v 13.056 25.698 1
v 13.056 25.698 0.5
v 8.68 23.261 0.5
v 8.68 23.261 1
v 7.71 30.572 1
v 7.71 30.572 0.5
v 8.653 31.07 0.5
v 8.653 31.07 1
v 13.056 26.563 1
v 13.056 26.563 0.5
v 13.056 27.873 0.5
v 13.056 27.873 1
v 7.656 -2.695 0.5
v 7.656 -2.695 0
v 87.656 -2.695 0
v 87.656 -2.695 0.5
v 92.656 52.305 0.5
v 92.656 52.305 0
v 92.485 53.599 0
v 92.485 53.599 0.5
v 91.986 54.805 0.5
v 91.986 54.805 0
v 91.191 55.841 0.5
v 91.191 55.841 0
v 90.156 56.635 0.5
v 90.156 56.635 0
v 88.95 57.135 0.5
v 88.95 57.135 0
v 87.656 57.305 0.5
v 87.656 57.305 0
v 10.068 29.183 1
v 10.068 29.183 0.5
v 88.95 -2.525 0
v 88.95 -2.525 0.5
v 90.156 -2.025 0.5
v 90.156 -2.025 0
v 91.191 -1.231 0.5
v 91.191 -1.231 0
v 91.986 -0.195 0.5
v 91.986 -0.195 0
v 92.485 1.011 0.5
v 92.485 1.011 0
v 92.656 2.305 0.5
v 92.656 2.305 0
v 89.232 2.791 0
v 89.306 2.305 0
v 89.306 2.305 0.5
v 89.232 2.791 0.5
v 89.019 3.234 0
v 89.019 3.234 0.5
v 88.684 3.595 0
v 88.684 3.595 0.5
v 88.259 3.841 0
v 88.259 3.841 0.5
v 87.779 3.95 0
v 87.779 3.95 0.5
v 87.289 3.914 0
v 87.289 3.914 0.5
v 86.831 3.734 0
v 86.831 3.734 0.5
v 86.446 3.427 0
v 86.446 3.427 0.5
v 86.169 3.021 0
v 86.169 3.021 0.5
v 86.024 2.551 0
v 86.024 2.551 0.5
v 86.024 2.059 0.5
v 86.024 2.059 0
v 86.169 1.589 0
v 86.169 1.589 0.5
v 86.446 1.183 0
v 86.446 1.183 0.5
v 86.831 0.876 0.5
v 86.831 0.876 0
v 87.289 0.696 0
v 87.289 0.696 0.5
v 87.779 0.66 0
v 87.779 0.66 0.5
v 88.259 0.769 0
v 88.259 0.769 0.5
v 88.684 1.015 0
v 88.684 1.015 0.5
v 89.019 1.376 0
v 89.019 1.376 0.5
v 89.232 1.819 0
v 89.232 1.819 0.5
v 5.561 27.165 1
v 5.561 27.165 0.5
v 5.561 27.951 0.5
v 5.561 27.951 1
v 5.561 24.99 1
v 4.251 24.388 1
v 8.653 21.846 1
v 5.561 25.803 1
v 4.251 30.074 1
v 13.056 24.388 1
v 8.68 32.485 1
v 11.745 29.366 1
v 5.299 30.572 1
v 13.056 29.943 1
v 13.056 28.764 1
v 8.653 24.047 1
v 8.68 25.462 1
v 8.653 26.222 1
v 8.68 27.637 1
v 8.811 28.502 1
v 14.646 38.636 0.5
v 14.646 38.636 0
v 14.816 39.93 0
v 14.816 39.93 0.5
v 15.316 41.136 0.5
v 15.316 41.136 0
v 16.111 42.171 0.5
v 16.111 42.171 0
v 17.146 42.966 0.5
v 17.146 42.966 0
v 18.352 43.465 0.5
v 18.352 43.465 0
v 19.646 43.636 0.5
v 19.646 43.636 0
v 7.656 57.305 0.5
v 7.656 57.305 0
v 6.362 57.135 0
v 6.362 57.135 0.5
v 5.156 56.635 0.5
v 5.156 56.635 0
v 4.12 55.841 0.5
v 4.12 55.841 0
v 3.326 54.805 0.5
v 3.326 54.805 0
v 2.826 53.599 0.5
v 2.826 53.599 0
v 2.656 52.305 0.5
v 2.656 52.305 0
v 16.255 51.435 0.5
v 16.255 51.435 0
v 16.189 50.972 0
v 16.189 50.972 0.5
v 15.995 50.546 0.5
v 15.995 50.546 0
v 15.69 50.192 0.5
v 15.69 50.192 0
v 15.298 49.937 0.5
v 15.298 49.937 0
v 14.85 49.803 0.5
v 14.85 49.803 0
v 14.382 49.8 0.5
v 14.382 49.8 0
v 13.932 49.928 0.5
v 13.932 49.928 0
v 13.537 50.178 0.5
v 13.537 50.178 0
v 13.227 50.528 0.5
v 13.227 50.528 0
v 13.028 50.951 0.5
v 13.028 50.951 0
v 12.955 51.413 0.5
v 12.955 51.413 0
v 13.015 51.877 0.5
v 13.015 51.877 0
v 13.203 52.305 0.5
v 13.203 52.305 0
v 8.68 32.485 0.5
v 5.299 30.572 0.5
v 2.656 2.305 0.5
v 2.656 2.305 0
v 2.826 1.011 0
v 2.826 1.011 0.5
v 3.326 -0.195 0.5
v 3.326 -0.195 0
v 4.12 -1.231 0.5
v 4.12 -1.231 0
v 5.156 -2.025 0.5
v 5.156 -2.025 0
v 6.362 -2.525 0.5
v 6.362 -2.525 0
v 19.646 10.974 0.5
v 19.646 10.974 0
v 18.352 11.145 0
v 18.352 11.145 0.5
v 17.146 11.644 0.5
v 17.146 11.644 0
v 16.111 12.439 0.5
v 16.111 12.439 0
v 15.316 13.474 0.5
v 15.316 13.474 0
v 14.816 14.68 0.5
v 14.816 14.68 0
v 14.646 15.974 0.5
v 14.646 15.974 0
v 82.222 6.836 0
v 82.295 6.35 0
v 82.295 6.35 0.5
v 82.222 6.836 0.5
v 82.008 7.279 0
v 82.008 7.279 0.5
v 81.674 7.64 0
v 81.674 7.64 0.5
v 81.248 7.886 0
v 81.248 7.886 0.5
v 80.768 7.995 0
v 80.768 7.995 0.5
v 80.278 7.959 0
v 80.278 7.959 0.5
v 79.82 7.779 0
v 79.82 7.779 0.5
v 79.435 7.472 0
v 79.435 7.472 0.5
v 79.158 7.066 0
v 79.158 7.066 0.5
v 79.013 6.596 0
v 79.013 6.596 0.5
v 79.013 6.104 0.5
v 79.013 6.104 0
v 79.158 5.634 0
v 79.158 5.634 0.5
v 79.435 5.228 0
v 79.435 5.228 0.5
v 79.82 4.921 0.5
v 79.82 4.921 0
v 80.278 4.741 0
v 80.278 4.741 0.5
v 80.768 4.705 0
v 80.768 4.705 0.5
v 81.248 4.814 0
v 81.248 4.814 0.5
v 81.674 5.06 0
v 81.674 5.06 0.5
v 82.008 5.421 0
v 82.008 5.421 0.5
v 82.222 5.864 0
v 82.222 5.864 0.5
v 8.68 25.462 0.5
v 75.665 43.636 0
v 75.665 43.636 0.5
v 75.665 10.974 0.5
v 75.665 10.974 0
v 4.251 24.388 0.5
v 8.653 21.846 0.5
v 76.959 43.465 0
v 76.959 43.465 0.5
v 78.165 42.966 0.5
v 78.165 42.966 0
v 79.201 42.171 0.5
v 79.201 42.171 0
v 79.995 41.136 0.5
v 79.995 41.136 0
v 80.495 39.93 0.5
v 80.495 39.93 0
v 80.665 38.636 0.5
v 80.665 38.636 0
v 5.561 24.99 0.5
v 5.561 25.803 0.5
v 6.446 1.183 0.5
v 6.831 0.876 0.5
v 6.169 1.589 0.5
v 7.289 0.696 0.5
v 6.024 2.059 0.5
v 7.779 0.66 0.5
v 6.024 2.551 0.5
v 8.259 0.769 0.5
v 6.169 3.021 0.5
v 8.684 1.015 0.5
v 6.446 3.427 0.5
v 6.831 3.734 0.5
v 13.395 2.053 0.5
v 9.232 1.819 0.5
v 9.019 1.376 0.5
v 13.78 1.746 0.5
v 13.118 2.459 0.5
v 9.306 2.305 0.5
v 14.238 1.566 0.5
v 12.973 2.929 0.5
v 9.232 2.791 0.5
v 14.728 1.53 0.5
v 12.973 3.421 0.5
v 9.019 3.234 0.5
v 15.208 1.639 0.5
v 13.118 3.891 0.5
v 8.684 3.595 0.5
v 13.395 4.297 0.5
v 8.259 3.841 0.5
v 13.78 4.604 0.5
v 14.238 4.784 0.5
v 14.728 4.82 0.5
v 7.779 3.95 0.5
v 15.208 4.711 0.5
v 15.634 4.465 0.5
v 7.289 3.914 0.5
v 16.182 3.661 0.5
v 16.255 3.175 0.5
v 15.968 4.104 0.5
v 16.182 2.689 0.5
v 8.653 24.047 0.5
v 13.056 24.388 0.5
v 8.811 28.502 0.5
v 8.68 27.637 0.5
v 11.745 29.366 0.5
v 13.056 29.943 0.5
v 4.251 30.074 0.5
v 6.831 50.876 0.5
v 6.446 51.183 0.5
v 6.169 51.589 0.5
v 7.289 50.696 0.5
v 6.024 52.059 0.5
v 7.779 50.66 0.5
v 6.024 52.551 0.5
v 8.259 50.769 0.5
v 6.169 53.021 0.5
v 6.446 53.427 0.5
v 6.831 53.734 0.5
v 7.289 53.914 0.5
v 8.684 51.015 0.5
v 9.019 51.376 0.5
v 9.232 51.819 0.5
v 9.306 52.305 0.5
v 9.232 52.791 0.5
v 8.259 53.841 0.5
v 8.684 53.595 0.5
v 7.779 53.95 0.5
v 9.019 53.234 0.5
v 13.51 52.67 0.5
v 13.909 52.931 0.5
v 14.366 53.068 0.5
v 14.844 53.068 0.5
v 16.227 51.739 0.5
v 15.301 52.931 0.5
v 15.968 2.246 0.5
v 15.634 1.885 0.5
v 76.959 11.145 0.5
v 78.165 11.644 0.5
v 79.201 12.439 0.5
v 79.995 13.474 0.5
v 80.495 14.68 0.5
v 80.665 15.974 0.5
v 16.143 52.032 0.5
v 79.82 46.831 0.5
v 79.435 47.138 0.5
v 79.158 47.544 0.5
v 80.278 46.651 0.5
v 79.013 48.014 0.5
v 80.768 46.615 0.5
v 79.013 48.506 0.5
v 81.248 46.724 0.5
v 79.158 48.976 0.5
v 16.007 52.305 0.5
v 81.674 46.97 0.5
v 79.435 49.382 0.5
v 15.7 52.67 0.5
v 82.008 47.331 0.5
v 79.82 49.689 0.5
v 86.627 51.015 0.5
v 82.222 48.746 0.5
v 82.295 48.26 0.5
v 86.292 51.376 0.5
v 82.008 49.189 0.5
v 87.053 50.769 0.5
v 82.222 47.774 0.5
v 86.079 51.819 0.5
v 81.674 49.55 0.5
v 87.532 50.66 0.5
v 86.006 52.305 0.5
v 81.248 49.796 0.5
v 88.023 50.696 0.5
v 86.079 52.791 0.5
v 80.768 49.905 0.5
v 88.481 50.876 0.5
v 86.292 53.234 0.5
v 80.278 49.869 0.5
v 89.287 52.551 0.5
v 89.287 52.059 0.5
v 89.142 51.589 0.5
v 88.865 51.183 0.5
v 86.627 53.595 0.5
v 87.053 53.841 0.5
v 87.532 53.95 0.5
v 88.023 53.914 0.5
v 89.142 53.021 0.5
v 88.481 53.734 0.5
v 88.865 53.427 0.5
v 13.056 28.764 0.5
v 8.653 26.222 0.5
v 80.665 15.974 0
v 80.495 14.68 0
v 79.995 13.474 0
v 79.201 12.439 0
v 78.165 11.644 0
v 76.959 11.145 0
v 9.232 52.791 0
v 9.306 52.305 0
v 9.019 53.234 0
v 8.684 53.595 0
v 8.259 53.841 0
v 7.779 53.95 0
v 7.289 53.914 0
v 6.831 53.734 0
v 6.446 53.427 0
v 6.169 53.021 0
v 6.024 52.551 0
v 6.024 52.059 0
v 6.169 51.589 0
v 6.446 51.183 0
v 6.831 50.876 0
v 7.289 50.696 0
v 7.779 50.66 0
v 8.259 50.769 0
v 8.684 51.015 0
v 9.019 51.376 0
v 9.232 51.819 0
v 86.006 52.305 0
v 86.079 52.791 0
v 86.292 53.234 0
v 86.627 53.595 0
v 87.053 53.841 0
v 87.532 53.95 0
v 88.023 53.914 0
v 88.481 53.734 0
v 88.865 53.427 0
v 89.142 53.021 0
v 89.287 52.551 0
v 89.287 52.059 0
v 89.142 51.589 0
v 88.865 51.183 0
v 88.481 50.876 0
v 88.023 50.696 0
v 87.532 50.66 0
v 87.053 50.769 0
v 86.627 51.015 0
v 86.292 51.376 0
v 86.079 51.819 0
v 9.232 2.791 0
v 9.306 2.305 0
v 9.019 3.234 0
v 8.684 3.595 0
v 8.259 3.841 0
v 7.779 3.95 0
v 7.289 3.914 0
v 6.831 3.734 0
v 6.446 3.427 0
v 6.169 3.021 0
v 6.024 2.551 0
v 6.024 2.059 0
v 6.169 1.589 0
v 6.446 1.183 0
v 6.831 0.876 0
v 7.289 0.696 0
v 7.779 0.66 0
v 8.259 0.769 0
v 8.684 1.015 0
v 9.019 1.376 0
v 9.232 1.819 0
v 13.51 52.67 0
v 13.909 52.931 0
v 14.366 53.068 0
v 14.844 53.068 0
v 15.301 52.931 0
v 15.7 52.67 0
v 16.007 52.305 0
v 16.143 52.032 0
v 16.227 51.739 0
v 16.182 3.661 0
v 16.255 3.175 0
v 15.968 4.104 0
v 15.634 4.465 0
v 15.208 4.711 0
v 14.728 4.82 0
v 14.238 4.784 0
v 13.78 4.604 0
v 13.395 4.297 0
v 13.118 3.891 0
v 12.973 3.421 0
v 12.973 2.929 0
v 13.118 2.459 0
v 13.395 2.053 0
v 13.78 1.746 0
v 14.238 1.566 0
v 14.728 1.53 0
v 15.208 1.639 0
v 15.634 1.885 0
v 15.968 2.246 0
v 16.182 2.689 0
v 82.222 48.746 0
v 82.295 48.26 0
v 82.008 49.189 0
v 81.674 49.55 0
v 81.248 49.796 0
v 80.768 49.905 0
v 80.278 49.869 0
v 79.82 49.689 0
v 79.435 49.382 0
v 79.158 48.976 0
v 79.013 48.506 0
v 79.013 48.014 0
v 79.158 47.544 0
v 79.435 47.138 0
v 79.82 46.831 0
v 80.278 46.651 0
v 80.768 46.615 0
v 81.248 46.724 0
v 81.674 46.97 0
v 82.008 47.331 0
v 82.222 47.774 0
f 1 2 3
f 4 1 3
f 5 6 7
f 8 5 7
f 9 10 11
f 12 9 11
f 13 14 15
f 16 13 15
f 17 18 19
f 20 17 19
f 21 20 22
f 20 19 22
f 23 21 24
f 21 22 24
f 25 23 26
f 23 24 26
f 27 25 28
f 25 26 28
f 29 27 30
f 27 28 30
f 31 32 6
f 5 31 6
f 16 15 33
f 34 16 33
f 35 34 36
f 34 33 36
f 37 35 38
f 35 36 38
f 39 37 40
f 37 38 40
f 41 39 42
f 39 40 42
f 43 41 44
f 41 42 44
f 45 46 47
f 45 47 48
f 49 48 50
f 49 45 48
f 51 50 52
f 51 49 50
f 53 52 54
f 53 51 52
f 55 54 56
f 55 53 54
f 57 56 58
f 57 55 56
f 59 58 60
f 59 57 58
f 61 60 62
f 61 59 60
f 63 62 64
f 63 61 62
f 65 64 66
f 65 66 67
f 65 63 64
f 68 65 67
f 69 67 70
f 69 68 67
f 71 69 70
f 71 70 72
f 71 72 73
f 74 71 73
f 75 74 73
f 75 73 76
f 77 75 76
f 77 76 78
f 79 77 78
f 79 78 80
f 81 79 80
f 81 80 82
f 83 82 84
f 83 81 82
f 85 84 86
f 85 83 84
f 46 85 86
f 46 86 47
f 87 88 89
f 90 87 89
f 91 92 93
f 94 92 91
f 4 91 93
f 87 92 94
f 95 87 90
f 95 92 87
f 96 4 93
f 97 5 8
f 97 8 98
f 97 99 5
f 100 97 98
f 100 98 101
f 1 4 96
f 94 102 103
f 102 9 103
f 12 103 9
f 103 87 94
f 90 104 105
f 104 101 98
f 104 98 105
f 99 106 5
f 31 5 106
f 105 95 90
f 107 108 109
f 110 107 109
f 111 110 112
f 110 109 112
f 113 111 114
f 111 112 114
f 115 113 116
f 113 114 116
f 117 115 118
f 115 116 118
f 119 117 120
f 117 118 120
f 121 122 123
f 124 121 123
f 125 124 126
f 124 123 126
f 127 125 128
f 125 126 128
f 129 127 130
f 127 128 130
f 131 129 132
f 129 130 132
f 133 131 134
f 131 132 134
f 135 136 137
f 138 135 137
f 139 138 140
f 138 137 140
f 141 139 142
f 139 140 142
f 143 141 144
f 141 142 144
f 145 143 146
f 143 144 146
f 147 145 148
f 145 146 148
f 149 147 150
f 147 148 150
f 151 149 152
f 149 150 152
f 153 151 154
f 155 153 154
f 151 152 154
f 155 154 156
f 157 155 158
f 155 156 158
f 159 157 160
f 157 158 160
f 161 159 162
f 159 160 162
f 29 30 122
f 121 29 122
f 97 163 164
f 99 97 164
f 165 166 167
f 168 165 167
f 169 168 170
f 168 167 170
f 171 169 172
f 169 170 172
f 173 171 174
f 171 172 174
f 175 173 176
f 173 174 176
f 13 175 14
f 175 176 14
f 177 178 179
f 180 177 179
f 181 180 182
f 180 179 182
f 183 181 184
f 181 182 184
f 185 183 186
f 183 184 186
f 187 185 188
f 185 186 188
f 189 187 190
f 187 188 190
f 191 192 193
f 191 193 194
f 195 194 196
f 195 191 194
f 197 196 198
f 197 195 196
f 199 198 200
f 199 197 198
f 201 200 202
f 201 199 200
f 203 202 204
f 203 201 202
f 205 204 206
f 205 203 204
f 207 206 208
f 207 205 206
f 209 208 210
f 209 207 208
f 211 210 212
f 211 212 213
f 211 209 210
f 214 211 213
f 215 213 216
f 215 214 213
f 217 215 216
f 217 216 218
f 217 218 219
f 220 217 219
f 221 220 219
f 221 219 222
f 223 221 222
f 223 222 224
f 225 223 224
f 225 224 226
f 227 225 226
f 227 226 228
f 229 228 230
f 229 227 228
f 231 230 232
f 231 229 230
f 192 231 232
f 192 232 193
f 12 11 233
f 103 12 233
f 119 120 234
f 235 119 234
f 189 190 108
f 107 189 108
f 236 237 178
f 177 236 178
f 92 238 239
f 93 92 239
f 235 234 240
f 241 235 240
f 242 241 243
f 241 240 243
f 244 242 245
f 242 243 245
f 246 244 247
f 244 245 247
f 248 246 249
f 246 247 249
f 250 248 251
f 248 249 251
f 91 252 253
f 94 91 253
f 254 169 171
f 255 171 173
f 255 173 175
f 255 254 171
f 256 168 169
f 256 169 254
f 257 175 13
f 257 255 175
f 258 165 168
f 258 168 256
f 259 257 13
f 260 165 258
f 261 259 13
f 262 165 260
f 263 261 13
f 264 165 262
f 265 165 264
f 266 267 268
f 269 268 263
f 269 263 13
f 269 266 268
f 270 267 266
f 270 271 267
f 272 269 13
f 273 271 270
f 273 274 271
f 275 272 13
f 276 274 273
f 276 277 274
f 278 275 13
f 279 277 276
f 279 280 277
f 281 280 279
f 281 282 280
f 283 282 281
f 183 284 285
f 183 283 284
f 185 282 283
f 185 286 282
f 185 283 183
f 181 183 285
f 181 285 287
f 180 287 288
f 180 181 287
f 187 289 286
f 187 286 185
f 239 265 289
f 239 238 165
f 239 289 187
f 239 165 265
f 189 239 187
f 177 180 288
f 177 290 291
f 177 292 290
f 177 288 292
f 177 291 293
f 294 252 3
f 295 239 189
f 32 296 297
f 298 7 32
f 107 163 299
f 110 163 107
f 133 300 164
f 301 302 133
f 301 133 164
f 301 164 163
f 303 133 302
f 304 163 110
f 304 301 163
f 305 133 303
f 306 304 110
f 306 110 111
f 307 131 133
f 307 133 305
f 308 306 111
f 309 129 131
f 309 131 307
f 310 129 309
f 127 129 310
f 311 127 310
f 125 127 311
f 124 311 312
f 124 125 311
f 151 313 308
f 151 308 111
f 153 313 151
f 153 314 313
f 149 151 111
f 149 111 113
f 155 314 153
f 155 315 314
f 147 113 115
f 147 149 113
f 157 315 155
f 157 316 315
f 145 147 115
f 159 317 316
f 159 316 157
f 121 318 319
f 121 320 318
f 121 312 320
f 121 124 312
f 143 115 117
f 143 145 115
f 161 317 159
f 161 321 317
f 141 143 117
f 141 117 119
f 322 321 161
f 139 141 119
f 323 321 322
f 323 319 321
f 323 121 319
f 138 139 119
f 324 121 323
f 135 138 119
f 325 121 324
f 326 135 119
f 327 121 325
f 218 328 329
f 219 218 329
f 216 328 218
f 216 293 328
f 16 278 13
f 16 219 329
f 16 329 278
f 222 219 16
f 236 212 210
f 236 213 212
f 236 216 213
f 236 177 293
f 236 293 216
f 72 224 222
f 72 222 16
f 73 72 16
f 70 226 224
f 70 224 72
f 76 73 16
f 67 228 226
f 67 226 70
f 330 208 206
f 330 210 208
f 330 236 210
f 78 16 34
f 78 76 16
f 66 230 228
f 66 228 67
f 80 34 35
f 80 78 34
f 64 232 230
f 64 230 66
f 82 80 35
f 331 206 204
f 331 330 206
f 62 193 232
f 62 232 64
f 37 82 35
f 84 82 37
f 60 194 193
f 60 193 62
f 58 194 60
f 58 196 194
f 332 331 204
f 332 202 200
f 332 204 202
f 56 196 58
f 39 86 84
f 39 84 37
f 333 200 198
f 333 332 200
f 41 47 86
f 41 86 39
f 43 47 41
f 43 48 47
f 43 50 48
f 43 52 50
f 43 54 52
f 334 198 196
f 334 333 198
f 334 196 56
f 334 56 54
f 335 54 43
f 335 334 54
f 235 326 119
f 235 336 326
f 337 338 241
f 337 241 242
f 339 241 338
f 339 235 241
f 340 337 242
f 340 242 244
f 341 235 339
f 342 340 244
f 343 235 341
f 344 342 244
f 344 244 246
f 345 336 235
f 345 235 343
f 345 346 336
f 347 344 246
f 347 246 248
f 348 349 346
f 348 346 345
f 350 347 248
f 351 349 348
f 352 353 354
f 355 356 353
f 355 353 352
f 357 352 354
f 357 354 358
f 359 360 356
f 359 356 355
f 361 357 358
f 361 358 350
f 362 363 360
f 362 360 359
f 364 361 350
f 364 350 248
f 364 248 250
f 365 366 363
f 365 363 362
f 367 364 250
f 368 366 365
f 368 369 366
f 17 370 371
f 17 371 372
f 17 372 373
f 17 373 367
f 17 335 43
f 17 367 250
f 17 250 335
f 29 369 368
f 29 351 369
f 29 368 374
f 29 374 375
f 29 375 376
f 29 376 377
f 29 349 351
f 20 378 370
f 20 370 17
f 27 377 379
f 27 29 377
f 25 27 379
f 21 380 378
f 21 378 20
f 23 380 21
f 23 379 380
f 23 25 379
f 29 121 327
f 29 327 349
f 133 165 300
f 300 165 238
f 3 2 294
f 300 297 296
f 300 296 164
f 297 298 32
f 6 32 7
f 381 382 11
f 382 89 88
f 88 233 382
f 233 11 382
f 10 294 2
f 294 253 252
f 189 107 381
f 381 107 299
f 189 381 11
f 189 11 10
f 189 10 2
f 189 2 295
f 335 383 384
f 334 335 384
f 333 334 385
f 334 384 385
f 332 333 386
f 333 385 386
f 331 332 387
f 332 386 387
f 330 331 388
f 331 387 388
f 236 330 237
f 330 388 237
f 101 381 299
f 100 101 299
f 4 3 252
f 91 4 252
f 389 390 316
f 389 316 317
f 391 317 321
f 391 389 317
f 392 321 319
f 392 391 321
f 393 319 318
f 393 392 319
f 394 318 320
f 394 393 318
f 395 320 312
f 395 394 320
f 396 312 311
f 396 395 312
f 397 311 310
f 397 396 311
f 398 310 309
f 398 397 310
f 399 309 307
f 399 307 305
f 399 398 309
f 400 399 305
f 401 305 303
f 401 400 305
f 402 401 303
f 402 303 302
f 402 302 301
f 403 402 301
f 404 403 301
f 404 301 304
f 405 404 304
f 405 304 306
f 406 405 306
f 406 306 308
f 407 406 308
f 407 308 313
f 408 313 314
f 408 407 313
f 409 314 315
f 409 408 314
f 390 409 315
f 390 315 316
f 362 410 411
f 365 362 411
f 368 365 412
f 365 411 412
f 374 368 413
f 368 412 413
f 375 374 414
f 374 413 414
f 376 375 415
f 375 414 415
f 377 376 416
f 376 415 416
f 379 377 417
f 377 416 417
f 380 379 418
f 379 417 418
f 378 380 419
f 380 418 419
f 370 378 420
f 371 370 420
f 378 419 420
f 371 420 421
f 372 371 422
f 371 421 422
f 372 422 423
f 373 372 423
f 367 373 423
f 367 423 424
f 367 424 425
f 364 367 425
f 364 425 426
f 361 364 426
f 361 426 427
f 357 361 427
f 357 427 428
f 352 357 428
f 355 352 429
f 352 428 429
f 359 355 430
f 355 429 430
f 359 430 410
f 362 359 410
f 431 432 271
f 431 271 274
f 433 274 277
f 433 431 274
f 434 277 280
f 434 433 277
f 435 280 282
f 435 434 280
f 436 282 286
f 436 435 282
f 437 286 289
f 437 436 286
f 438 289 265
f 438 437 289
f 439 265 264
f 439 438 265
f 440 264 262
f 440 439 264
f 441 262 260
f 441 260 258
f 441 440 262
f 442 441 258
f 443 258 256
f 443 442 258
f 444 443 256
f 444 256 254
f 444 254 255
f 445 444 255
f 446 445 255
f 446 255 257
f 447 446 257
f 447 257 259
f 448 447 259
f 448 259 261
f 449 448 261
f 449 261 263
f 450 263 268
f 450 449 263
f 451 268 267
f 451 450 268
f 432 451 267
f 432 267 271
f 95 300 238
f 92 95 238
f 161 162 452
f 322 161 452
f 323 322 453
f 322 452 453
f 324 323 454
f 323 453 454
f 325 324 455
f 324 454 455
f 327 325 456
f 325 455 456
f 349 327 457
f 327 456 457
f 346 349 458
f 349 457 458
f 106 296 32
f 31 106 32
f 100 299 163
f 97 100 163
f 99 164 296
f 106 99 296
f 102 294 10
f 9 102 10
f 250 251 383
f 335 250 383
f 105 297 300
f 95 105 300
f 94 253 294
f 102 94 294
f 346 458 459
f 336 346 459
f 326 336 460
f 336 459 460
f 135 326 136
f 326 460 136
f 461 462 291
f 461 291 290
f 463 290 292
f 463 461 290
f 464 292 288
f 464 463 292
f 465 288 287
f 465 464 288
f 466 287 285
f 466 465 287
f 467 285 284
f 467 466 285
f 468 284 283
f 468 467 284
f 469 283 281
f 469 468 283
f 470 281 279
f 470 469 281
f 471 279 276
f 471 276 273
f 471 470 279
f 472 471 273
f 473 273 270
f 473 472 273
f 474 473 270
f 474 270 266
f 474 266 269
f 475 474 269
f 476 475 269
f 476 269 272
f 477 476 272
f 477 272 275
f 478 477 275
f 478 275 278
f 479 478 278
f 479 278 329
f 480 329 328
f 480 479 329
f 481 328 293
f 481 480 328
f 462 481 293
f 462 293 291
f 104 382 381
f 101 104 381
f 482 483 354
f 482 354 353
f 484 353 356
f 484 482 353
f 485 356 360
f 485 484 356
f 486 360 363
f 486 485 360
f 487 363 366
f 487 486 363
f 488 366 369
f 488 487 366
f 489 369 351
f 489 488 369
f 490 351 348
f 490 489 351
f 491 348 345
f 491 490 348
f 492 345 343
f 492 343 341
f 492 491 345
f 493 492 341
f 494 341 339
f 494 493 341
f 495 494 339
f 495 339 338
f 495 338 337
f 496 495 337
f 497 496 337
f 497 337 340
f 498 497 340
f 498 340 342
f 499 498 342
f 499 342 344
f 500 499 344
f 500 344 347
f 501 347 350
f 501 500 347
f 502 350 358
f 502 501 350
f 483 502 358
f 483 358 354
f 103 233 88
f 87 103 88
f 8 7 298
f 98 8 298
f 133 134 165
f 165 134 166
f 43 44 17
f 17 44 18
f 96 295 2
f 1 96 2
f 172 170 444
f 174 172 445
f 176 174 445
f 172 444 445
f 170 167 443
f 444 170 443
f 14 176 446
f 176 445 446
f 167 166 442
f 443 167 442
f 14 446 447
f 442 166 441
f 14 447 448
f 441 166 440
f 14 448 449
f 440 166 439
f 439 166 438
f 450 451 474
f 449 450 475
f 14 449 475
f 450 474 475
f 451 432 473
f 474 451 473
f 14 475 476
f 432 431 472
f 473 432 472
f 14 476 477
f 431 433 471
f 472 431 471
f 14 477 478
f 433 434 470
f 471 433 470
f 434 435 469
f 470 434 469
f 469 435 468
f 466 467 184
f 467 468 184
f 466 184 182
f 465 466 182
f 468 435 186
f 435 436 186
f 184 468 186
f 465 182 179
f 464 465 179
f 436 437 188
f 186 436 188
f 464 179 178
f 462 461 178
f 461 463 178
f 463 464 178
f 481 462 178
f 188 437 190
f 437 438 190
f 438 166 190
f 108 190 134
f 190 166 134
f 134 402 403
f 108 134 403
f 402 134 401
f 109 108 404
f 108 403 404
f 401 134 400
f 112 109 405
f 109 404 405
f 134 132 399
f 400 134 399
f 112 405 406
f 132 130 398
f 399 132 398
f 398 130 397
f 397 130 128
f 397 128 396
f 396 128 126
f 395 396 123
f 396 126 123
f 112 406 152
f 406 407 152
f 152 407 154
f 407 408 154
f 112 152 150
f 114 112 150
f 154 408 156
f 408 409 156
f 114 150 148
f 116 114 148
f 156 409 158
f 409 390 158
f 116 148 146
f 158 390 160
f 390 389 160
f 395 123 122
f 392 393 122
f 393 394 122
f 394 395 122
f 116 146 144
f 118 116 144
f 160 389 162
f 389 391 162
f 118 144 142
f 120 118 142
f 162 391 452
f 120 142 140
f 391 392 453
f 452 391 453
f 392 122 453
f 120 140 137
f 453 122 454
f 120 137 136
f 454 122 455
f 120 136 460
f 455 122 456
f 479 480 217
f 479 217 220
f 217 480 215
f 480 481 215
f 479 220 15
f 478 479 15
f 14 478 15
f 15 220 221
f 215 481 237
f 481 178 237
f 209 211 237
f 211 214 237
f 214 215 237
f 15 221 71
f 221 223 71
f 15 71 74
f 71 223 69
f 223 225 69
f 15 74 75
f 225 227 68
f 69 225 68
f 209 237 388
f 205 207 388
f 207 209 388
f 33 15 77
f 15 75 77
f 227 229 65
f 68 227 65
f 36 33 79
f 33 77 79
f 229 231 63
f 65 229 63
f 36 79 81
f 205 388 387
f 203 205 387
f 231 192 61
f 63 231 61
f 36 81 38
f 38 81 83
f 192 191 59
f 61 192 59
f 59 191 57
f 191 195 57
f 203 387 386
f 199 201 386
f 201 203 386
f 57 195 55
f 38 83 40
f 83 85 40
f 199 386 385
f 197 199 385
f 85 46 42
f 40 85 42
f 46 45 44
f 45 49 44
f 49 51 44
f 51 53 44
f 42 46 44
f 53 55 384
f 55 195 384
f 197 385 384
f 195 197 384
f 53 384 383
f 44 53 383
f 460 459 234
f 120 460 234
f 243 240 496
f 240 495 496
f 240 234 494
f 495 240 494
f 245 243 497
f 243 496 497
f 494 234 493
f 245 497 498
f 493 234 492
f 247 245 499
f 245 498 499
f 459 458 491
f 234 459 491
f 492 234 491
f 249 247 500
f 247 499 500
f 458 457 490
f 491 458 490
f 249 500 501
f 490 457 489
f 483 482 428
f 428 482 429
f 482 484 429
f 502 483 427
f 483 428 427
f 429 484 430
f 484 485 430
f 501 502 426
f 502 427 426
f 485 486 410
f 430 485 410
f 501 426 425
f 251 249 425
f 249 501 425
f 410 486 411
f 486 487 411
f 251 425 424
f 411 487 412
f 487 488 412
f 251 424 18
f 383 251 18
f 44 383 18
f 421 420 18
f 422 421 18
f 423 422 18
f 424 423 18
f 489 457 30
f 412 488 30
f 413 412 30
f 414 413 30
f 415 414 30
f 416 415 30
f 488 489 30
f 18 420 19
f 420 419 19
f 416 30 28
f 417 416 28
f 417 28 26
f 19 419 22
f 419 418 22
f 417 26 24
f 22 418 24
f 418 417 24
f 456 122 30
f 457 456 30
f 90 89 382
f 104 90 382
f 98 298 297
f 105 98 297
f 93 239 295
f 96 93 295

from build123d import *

# Parameters (mm, degrees)
F0_R     = 1.65
F1_DEPTH = 0.5
F2_DEPTH = 1


with BuildPart() as f1:
    # F0 (on Top) → F1 (new body)
    with BuildSketch(Plane.XY):
        with Locations((7.655694, 52.305)):
            Circle(F0_R)
        with BuildLine():
            ThreePointArc((89.305694, 52.305), (87.655694, 53.955), (86.005694, 52.305))
            ThreePointArc((86.005694, 52.305), (87.655694, 50.655), (89.305694, 52.305))
        make_face()
        with BuildLine():
            ThreePointArc((92.655694, 52.305), (91.191228, 55.840534), (87.655694, 57.305))
            Line((87.655694, 57.305), (7.655694, 57.305))
            ThreePointArc((7.655694, 57.305), (4.12016, 55.840534), (2.655694, 52.305))
            Line((2.655694, 52.305), (2.655694, 2.305))
            ThreePointArc((2.655694, 2.305), (4.12016, -1.230534), (7.655694, -2.695))
            Line((7.655694, -2.695), (87.655694, -2.695))
            ThreePointArc((87.655694, -2.695), (91.191228, -1.230534), (92.655694, 2.305))
            Line((92.655694, 2.305), (92.655694, 52.305))
        make_face()
        with Locations((7.655694, 2.305)):
            Circle(F0_R, mode=Mode.SUBTRACT)
        with Locations((14.605, 3.175)):
            Circle(F0_R, mode=Mode.SUBTRACT)
        Polygon((8.679579, 23.260895), (13.055694, 25.697895), (13.055694, 24.38768), (8.653374, 21.845862), (4.251055, 24.38768), (4.251055, 30.07397), (8.679579, 27.636997), (11.745485, 29.36645), (8.653374, 31.069739), (7.710021, 30.571854), (10.068401, 29.183032), (8.810601, 28.50173), (5.299226, 30.571854), (8.679579, 32.484765), (13.055694, 29.942947), (13.055694, 28.763775), (8.653374, 26.221977), (5.56127, 27.95145), (5.56127, 27.165331), (8.679579, 25.462055), (13.055694, 27.872837), (13.055694, 26.562635), (8.653374, 24.047022), (5.56127, 25.802713), (5.56127, 24.990375), align=None, mode=Mode.SUBTRACT)
        with Locations((87.655694, 2.305)):
            Circle(F0_R, mode=Mode.SUBTRACT)
        with Locations((80.645, 6.35)):
            Circle(F0_R, mode=Mode.SUBTRACT)
        with BuildLine():
            Line((19.646068, 43.635763), (75.66532, 43.635763))
            ThreePointArc((75.66532, 43.635763), (79.200854, 42.171297), (80.66532, 38.635763))
            Line((80.66532, 38.635763), (80.66532, 15.974237))
            ThreePointArc((80.66532, 15.974237), (79.200854, 12.438703), (75.66532, 10.974237))
            Line((75.66532, 10.974237), (19.646068, 10.974237))
            ThreePointArc((19.646068, 10.974237), (16.110534, 12.438703), (14.646068, 15.974237))
            Line((14.646068, 15.974237), (14.646068, 38.635763))
            ThreePointArc((14.646068, 38.635763), (16.110534, 42.171297), (19.646068, 43.635763))
        make_face(mode=Mode.SUBTRACT)
        with Locations((7.655694, 52.305)):
            Circle(F0_R, mode=Mode.SUBTRACT)
        with BuildLine():
            ThreePointArc((16.006999, 52.305), (16.191789, 51.887329), (16.255, 51.435))
            ThreePointArc((16.255, 51.435), (14.152671, 49.848211), (13.203001, 52.305))
            ThreePointArc((13.203001, 52.305), (14.605, 53.085), (16.006999, 52.305))
        make_face(mode=Mode.SUBTRACT)
        with Locations((80.645, 48.26)):
            Circle(F0_R, mode=Mode.SUBTRACT)
        with BuildLine():
            ThreePointArc((89.305694, 52.305), (87.655694, 50.655), (86.005694, 52.305))
            ThreePointArc((86.005694, 52.305), (87.655694, 53.955), (89.305694, 52.305))
        make_face(mode=Mode.SUBTRACT)
        Polygon((13.055694, 24.38768), (13.055694, 25.697895), (8.679579, 23.260895), (5.56127, 24.990375), (5.56127, 25.802713), (8.653374, 24.047022), (13.055694, 26.562635), (13.055694, 27.872837), (8.679579, 25.462055), (5.56127, 27.165331), (5.56127, 27.95145), (8.653374, 26.221977), (13.055694, 28.763775), (13.055694, 29.942947), (8.679579, 32.484765), (5.299226, 30.571854), (8.810601, 28.50173), (10.068401, 29.183032), (7.710021, 30.571854), (8.653374, 31.069739), (11.745485, 29.36645), (8.679579, 27.636997), (4.251055, 30.07397), (4.251055, 24.38768), (8.653374, 21.845862), align=None)
    extrude(amount=F1_DEPTH)

    # F0 (on Top) → F2 (join)
    with BuildSketch(Plane.XY):
        Polygon((13.055694, 24.38768), (13.055694, 25.697895), (8.679579, 23.260895), (5.56127, 24.990375), (5.56127, 25.802713), (8.653374, 24.047022), (13.055694, 26.562635), (13.055694, 27.872837), (8.679579, 25.462055), (5.56127, 27.165331), (5.56127, 27.95145), (8.653374, 26.221977), (13.055694, 28.763775), (13.055694, 29.942947), (8.679579, 32.484765), (5.299226, 30.571854), (8.810601, 28.50173), (10.068401, 29.183032), (7.710021, 30.571854), (8.653374, 31.069739), (11.745485, 29.36645), (8.679579, 27.636997), (4.251055, 30.07397), (4.251055, 24.38768), (8.653374, 21.845862), align=None)
    extrude(amount=F2_DEPTH)


solid = f1.part
